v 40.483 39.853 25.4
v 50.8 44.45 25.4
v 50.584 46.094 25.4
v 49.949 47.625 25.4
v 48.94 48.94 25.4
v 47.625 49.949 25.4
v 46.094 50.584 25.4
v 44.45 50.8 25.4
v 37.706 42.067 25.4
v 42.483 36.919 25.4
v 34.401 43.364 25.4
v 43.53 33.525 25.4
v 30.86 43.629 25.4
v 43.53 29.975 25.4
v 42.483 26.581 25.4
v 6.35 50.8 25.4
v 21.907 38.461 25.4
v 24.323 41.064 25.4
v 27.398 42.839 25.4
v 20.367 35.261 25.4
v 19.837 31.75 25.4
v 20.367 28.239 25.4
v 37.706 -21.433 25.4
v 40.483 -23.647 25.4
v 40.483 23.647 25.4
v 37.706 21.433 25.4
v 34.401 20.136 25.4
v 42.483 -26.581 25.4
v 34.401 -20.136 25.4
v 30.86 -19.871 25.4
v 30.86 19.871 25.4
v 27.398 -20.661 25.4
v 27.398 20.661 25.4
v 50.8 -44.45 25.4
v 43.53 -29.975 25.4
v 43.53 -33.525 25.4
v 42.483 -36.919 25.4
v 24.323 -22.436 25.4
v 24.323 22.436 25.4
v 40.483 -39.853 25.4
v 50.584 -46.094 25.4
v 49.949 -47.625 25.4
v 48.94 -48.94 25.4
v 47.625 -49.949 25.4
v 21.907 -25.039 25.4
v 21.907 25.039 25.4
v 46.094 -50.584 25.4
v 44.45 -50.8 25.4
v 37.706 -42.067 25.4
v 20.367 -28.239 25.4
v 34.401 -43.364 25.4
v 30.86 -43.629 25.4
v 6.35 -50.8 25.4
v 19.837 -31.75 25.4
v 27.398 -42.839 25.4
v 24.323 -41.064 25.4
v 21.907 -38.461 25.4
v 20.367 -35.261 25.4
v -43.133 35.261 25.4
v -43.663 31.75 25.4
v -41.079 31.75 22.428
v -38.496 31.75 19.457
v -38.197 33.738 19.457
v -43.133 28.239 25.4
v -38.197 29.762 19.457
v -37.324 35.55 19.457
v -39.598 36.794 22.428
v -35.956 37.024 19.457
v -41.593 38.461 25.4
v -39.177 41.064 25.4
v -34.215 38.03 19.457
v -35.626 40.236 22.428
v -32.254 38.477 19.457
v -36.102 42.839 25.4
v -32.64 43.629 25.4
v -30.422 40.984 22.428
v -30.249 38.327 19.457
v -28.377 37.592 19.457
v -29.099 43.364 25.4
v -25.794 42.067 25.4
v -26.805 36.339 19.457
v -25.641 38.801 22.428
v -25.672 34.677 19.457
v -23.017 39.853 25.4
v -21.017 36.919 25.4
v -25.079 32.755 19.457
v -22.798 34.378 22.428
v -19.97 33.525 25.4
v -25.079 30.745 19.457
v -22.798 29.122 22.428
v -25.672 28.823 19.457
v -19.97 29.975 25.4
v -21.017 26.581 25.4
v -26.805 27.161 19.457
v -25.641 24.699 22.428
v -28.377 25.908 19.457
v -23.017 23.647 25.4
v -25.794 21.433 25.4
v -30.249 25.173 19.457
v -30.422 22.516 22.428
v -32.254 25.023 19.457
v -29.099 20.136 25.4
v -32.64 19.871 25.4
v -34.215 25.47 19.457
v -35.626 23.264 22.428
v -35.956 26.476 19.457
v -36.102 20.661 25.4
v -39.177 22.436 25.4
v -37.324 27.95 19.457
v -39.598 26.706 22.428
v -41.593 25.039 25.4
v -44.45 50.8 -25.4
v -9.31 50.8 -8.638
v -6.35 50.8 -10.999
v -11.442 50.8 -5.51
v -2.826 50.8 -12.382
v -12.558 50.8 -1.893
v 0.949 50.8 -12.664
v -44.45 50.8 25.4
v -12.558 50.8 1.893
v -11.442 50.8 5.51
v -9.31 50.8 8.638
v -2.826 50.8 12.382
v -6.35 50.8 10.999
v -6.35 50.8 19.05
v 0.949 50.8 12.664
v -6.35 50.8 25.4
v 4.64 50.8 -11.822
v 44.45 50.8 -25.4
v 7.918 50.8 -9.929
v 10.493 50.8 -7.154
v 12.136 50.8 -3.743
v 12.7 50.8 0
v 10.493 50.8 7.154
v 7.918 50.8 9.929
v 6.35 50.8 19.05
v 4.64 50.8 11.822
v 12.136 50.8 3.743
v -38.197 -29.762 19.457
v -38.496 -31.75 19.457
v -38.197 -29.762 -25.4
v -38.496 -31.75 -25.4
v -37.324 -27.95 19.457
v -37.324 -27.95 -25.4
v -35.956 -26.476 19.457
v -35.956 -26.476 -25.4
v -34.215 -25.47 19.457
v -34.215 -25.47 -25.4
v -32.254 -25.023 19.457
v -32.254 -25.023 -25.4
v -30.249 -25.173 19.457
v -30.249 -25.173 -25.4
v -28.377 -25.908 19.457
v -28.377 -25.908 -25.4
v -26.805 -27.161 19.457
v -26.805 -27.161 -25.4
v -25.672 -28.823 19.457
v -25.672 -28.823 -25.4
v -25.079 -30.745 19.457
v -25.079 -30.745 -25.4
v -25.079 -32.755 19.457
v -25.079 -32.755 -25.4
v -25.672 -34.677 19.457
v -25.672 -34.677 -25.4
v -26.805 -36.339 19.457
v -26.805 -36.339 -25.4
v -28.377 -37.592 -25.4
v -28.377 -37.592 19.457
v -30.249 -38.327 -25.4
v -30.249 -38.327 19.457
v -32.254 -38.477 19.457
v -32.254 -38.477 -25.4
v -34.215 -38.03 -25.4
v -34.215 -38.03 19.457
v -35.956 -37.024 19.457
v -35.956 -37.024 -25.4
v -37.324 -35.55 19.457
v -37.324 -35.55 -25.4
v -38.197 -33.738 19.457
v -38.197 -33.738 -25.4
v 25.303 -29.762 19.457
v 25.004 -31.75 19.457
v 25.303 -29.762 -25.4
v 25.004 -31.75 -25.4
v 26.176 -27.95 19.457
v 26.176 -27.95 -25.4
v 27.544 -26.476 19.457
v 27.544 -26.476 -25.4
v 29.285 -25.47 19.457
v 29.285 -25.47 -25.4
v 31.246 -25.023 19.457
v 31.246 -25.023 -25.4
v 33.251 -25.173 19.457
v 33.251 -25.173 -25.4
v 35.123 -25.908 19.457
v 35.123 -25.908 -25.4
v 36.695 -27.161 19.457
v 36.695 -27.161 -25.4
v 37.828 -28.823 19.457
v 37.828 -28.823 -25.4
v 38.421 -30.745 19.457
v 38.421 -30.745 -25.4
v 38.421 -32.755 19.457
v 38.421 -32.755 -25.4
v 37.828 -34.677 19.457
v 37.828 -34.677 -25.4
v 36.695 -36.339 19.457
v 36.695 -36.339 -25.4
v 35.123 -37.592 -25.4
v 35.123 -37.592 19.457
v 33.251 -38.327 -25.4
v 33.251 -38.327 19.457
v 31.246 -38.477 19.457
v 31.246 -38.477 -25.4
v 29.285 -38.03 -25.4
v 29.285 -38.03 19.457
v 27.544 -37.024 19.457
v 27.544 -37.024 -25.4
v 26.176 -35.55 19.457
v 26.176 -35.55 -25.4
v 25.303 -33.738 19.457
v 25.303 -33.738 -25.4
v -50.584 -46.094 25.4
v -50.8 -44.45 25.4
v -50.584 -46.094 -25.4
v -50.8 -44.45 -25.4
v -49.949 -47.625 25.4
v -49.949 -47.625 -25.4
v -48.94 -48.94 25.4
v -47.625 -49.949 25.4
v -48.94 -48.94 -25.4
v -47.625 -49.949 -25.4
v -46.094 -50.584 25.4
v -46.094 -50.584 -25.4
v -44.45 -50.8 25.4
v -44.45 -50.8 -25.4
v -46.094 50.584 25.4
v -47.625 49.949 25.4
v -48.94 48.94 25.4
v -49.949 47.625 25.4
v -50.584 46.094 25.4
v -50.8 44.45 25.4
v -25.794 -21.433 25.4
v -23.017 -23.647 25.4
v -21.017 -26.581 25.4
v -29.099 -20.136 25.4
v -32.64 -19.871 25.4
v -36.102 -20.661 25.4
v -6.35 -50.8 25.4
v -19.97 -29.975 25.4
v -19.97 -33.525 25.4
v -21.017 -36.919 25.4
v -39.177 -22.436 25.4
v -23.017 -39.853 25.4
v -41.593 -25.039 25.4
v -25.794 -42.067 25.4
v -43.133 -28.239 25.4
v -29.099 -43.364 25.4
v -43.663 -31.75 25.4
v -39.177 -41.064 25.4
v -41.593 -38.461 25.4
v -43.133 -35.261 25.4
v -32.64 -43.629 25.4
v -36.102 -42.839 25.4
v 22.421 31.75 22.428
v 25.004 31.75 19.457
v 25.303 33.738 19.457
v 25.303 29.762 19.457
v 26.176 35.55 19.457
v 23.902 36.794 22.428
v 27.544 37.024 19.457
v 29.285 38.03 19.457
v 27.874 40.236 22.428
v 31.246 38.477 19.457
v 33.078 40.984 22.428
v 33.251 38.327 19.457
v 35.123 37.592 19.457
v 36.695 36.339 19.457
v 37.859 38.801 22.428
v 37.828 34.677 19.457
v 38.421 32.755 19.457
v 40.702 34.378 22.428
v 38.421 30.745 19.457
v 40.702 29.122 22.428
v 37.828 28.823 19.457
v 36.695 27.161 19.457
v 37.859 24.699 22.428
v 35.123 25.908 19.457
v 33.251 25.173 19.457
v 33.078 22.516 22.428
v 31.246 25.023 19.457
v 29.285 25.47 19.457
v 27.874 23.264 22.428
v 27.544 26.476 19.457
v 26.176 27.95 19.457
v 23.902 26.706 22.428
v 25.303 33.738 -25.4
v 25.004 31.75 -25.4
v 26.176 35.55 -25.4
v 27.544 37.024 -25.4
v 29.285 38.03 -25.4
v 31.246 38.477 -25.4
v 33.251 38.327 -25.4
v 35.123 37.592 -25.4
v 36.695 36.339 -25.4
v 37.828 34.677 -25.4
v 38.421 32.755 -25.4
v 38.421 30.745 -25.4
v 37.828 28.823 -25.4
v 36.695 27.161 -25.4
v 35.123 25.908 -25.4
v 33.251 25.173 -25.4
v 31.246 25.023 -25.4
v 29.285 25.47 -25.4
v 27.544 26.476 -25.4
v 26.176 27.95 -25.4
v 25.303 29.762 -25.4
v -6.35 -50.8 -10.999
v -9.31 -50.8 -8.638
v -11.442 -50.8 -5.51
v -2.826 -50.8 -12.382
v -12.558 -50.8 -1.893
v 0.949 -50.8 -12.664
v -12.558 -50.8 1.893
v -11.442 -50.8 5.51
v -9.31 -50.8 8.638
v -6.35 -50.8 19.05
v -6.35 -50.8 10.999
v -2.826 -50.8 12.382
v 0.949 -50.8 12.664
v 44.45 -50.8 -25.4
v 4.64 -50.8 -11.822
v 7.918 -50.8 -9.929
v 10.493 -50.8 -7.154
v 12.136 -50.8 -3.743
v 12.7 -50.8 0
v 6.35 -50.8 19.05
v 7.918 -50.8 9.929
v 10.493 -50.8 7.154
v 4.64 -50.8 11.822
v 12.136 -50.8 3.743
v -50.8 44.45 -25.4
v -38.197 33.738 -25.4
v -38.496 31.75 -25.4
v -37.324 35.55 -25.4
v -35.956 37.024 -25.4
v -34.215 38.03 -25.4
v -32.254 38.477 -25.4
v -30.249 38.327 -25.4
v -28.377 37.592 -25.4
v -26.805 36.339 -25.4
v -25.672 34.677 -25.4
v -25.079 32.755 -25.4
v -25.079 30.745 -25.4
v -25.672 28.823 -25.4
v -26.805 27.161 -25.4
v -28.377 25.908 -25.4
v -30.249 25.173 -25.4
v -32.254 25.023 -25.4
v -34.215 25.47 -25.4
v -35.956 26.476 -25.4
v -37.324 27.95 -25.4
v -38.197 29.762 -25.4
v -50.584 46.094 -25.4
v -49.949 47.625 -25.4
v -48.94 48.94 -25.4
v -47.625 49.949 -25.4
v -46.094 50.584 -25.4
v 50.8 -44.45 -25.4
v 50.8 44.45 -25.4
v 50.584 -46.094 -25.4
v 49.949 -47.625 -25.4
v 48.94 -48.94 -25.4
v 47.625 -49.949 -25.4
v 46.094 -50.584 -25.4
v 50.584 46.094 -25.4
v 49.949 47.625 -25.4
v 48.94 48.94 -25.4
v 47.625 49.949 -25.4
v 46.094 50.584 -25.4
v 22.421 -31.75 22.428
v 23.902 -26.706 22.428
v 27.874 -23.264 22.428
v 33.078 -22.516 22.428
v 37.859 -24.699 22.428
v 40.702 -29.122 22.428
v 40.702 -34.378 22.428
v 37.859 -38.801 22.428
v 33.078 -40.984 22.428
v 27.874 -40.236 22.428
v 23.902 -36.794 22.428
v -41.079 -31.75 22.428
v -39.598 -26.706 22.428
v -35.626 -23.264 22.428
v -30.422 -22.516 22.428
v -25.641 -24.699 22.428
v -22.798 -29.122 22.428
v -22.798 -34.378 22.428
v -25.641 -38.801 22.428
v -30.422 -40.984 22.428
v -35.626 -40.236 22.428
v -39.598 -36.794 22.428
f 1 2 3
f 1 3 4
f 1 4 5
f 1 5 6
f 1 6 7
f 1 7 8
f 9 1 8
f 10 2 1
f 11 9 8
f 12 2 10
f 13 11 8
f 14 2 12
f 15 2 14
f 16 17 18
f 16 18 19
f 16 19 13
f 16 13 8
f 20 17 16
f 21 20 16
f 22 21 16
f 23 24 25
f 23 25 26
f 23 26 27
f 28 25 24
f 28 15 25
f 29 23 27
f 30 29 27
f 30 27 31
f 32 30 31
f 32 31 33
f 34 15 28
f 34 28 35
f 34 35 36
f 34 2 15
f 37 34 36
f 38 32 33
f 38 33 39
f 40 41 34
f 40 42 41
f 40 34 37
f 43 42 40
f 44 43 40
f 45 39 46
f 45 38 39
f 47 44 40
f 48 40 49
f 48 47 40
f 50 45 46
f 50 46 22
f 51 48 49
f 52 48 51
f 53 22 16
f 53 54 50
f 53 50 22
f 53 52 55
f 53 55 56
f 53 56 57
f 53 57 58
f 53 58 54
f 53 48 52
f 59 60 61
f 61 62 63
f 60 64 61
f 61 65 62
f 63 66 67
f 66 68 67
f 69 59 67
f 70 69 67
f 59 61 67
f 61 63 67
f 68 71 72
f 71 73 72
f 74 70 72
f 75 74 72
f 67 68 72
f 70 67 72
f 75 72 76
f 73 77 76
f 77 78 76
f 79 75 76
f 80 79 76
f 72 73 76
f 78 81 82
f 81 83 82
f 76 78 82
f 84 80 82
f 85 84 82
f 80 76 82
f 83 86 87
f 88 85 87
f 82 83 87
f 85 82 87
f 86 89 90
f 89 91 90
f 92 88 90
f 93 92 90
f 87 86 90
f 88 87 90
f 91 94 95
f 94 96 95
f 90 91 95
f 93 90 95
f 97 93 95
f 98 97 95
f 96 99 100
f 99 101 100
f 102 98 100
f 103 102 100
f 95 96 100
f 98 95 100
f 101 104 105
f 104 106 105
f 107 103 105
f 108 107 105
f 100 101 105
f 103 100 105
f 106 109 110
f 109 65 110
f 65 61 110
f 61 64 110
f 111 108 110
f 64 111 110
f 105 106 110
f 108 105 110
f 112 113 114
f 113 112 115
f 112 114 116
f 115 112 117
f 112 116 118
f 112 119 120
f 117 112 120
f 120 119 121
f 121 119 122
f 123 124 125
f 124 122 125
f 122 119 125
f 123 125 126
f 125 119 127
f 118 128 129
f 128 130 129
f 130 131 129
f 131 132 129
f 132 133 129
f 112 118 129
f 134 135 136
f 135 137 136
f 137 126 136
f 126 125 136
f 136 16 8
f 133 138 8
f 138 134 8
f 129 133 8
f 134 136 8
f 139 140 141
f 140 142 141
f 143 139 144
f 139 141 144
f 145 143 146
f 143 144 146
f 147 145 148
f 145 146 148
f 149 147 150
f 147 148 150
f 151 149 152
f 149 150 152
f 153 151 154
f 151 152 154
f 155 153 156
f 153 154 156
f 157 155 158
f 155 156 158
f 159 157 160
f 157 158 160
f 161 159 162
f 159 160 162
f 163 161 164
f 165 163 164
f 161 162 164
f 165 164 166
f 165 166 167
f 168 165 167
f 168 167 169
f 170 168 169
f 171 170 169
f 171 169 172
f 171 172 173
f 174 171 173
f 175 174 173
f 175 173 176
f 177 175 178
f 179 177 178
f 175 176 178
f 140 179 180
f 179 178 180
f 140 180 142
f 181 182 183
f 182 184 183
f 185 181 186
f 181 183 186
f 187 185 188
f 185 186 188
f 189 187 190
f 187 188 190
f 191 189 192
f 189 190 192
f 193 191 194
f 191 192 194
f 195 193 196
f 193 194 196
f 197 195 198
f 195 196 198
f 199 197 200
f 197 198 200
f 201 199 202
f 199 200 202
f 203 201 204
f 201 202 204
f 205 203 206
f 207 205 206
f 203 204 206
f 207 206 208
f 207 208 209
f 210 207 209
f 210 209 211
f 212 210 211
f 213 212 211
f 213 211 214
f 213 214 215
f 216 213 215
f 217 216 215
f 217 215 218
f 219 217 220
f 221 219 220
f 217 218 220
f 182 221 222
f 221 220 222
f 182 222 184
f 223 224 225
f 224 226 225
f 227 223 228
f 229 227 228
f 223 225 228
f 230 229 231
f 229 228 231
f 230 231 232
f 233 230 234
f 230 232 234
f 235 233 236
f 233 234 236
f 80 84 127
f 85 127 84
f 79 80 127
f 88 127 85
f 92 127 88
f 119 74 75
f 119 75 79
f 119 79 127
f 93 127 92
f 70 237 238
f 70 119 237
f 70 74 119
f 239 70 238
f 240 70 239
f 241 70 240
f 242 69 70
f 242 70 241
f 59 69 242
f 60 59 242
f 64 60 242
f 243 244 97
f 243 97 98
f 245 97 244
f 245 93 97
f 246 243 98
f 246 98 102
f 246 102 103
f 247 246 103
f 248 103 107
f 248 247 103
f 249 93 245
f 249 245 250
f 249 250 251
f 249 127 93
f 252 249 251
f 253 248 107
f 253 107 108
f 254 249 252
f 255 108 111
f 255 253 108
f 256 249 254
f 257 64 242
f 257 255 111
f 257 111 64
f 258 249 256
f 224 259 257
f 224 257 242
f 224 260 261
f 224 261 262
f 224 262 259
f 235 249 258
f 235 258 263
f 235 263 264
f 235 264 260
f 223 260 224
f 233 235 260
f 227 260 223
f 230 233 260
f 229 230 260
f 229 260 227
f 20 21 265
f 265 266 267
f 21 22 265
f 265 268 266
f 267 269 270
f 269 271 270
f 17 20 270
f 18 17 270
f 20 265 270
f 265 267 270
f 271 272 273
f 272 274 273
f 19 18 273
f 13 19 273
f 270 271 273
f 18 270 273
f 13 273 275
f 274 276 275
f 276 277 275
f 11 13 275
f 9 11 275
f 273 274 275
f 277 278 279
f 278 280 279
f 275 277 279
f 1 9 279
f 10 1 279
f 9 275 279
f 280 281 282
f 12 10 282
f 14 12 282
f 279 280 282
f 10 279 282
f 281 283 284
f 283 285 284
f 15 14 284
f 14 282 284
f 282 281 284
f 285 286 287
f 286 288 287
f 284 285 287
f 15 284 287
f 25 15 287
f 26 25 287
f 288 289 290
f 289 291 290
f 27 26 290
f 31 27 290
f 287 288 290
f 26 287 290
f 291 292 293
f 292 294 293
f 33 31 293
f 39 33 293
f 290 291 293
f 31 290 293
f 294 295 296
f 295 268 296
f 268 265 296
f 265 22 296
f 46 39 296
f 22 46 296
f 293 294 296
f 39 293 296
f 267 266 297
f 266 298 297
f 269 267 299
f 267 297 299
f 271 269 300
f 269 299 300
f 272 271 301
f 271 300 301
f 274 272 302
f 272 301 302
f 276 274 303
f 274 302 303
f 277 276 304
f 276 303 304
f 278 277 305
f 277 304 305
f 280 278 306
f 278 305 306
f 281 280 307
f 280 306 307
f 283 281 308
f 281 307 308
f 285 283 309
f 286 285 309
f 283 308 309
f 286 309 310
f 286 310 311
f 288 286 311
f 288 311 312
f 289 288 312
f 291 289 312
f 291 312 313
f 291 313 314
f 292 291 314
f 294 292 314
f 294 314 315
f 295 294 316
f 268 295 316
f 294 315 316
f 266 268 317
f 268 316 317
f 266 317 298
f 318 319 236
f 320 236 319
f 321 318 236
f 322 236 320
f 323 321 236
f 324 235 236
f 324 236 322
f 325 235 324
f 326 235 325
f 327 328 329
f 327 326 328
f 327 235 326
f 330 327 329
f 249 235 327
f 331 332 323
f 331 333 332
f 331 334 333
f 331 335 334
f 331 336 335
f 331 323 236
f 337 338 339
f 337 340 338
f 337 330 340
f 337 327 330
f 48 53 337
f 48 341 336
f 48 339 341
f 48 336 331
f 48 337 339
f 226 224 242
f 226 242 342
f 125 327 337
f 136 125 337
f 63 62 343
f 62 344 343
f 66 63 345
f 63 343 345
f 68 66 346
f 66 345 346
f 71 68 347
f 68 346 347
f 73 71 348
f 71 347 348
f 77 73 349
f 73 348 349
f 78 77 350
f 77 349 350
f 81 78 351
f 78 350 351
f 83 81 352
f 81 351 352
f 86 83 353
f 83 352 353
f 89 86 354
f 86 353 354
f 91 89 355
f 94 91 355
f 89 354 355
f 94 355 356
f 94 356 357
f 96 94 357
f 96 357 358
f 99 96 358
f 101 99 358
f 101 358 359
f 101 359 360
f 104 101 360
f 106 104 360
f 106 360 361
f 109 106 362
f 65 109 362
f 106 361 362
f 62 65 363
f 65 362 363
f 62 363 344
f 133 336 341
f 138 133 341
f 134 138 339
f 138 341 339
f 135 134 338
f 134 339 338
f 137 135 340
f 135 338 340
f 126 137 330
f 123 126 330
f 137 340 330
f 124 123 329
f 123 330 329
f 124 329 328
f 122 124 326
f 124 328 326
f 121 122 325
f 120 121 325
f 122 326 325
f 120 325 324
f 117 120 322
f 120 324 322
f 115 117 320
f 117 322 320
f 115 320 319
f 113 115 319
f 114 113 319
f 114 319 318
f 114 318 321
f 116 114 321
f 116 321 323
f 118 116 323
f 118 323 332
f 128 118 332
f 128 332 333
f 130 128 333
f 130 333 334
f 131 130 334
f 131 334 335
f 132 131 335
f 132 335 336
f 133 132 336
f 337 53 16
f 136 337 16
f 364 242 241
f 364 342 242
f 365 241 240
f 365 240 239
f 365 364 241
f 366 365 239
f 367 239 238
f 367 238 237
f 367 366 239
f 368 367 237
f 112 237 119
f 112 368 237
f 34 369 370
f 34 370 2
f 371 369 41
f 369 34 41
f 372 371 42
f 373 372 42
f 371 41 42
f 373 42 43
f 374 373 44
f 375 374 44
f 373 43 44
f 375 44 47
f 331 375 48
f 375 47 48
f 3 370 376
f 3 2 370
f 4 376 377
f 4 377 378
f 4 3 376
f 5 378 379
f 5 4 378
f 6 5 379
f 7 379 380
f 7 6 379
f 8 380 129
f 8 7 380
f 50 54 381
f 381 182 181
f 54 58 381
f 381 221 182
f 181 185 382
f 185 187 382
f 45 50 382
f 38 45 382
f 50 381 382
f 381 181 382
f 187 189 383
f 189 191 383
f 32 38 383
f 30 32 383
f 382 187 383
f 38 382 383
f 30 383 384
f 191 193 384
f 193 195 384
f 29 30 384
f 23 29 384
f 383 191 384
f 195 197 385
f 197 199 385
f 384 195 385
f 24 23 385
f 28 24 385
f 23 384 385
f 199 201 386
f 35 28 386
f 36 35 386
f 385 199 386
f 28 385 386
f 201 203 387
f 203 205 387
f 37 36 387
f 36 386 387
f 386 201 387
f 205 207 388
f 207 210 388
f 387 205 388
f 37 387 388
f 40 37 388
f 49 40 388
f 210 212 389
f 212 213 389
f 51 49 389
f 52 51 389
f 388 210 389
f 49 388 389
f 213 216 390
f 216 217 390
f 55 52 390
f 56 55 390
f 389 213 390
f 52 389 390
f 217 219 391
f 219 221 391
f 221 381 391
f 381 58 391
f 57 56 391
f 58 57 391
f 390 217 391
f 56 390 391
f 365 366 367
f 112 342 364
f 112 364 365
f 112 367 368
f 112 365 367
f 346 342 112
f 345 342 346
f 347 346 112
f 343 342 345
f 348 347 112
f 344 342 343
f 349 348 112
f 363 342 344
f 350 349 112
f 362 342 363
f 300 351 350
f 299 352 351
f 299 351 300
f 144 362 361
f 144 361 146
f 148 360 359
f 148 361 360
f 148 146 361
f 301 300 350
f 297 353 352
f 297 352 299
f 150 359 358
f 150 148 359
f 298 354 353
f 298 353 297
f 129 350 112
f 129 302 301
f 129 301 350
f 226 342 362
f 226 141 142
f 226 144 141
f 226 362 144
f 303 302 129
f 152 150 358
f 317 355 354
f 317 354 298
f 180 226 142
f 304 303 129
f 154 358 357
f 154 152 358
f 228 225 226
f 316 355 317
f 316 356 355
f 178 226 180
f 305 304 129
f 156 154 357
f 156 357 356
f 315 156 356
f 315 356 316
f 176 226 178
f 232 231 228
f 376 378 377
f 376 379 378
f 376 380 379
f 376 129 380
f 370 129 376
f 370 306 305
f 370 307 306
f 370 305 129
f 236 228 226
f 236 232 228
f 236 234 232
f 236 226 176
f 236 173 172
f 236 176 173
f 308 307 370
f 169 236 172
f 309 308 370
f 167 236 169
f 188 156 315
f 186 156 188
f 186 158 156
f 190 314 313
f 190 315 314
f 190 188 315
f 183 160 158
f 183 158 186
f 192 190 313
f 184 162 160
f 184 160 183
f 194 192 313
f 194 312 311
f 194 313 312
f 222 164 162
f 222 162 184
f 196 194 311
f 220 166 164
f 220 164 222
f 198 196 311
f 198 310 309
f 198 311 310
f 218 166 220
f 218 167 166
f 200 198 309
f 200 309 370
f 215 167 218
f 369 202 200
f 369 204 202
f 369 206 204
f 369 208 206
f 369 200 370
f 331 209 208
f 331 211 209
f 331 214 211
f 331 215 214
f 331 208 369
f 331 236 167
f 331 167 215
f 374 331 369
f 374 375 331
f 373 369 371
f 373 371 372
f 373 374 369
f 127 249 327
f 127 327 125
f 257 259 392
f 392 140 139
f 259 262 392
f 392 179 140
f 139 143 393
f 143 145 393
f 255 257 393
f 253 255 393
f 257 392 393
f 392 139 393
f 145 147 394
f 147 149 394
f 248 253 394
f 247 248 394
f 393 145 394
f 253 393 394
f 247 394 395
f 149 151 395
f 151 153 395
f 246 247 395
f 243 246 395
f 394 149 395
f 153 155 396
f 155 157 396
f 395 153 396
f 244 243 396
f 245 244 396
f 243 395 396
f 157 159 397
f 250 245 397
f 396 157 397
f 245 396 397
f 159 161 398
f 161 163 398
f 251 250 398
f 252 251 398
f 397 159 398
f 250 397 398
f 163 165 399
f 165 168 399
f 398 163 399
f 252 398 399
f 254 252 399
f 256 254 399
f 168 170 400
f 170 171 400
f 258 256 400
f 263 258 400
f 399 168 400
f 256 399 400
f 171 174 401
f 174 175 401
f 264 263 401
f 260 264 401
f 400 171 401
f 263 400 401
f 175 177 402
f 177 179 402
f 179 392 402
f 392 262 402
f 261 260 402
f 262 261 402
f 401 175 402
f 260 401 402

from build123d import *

# Parameters (mm, degrees)
F1_DEPTH       = 50.8
F3_D           = 13.49248
F3_CSINK_D     = 23.8252
F3_CSINK_ANGLE = 82
F4_R           = 6.35
F5_W           = 12.7
F5_H           = 101.6
F6_DEPTH       = 6.35
F7_R           = 12.7
F8_DEPTH       = 101.601


# Not quite as in the source:
# - a feature of the source that left no trace in its solid (it failed there, or was rolled back) is left out


with BuildPart() as f1:
    # F0 (on Front) → F1 (new body, symmetric)
    with BuildSketch(Plane.XZ):
        Polygon((12.601675614, 25.4), (-50.8, 25.4), (-50.8, -25.4), (50.8, -25.4), (50.8, 25.4), align=None)
    extrude(amount=F1_DEPTH, both=True)

    # F3 (through all)
    with Locations(Plane.XY.offset(25.4)):
        with Locations((-31.75, 31.75), (31.75, 31.75), (-31.75, -31.75), (31.75, -31.75)):
            CounterSinkHole(F3_D / 2, F3_CSINK_D / 2, counter_sink_angle=F3_CSINK_ANGLE)

    # F4
    f4_edges = [f1.edges().sort_by_distance(p)[0] for p in [
        (-50.8, 50.8, 0),
        (-50.8, -50.8, 0),
        (50.8, -50.8, 0),
        (50.8, 50.8, 0),
    ]]
    fillet(f4_edges, radius=F4_R)

    # F5 (on face) → F6 (cut)
    with BuildSketch(Plane.XY.offset(25.4)):
        Rectangle(F5_W, F5_H)
    extrude(amount=-F6_DEPTH, mode=Mode.SUBTRACT)

    # F7 (on face) → F8 (cut, through all)
    with BuildSketch(Plane.XZ.offset(50.8)):
        Circle(F7_R)
    extrude(amount=-F8_DEPTH, mode=Mode.SUBTRACT)


solid = f1.part
